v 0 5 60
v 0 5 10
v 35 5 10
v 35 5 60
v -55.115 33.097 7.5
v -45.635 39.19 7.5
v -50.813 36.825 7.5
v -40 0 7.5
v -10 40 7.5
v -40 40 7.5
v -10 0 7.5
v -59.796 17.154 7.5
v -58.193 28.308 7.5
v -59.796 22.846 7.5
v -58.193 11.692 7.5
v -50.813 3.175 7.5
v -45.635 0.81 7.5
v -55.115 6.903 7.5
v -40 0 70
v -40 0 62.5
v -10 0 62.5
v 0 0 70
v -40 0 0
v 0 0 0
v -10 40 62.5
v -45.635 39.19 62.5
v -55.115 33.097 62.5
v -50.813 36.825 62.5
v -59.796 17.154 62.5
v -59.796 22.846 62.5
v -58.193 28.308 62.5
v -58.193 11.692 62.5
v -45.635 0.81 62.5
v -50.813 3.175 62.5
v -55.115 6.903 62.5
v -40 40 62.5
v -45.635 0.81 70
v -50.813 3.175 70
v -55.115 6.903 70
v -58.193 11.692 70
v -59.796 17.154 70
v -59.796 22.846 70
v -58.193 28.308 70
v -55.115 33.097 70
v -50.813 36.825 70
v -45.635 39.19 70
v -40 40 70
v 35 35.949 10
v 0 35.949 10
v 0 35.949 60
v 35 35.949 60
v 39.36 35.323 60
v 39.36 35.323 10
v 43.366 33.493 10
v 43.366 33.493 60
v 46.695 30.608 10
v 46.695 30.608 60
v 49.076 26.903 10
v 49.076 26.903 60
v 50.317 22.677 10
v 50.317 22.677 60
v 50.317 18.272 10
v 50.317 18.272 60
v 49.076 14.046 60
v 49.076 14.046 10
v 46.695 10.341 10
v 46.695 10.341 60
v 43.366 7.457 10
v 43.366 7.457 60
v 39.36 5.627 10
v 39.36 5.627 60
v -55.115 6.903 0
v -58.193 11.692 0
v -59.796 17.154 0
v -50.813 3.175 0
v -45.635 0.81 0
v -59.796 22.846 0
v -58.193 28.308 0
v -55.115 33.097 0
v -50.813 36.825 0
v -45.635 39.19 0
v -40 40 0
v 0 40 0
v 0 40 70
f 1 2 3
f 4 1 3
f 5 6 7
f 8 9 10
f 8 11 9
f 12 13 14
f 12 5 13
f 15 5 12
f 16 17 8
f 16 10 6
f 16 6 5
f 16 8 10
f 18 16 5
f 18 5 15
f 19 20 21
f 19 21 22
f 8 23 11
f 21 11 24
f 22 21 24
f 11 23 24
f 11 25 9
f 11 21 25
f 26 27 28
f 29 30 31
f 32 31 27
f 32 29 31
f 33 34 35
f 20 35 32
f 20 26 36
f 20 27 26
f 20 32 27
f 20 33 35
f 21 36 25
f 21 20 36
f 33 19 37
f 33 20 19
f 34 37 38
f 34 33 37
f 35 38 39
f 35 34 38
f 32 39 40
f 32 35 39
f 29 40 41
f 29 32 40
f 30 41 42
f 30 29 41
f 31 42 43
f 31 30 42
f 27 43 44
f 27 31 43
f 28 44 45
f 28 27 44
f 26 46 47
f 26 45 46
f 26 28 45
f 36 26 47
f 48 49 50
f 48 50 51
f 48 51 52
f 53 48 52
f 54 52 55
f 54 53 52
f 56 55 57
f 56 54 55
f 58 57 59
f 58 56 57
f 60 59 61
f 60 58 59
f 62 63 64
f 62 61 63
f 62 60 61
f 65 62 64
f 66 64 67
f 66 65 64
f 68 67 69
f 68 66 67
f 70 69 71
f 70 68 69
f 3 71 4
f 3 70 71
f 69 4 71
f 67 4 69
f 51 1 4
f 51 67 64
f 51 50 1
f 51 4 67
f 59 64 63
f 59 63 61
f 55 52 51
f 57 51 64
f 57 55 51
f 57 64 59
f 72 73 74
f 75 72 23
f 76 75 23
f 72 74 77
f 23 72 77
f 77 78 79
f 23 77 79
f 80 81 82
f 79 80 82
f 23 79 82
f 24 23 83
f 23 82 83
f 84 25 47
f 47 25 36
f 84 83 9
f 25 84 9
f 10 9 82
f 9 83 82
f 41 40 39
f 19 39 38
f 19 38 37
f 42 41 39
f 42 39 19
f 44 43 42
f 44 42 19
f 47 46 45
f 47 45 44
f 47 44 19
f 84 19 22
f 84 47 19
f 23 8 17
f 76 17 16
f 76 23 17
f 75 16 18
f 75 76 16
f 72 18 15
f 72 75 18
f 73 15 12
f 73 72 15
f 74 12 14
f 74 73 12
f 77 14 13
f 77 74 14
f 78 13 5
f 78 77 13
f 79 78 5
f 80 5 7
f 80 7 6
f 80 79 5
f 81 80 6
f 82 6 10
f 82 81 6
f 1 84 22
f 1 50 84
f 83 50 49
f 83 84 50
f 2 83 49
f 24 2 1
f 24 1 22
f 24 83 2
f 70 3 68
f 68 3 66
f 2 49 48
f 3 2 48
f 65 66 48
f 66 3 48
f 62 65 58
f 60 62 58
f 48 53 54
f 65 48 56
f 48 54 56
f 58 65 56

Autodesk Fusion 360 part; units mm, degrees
sketch "Sketch1" plane through (0, 0, 0) normal (0, 0, 1) x (1, 0, 0)
  line L0 (0, 0) -> (0, 31.8988)
  line L1 (0, 31.8988) -> (70, 31.8988)
  line L2 (0, 0) -> (0, -30)
  line L3 (0, -30) -> (70, -30)
  arc A0 (70, -30) -> (70, 31.8988) centre (70, 0.9494) ccw
  dimension "d1" = 70
  dimension "d2" = 30
  dimension "d23" = 70
extrude "Extrude1" add sketch "Sketch1" along normal mid plane 100
sketch "Sketch6" plane through (0, 0, 0) normal (0, 0, 1) x (1, 0, 0)
  line L0 (0, 0) -> (0, 40)
  line L1 (0, 0) -> (0, -40)
  line L2 (0, 40) -> (-80, 40)
  line L3 (-80, -40) -> (0, -40)
  line L4 (-80, -40) -> (-80, 40) construction
  arc A0 (-80, 40) -> (-80, -40) centre (-80, 0) ccw
  dimension "d24" = 40
  dimension "d25" = 40
  dimension "d42" = 80
extrude "Extrude5" add sketch "Sketch6" along normal mid plane 140
sketch "Sketch8" plane through (0, 0, 70) normal (0, 0, 1) x (-1, 0, 0)
  line L0 (0, 40) -> (0, -40)
  line L1 (0, -40) -> (80, -40)
  line L2 (80, 40) -> (0, 40)
  circle A0 centre (80, 0) radius 17.5 construction
  line L3 (80, 0) -> (80, -30) construction
  line L4 (80, 0) -> (48.1334, 0) construction
  line L5 (80, 0) -> (53.2858, -26.7142) construction
  circle A1 centre (67.6256, -12.3744) radius 2
  circle A2 centre (92.3744, -12.3744) radius 2
  circle A3 centre (92.3744, 12.3744) radius 2
  circle A4 centre (67.6256, 12.3744) radius 2
  arc A5 (80, -40) -> (80, 40) centre (80, 0) ccw
  dimension "d33" = 35
  dimension "d35" = 45
  dimension "d36" = 4
  dimension "d38" = 360
sketch "Sketch9" plane through (0, -40, 0) normal (0, -1, 0) x (1, 0, 0)
  line L0 (0, -70) -> (0, 70)
  line L1 (0, 70) -> (-80, 70)
  line L2 (-80, 70) -> (-80, -70)
  line L3 (-80, -70) -> (0, -70)
  line L4 (-160, 55) -> (-20, 55)
  line L5 (-20, 55) -> (-20, -55)
  line L6 (-20, -55) -> (-160, -55)
  line L7 (-160, -55) -> (-160, 55)
  dimension "d44" = 15
  dimension "d45" = 15
  dimension "d46" = 20
extrude "Extrude8" cut sketch "Sketch9" against normal blind 140 contours L2 L4 L6 L7 | L2 L4 L5 L6
sketch "Sketch10" plane through (0, 0, 0) normal (0, 1, 0) x (1, 0, 0)
  line L0 (70, -35) -> (70, -15) construction
  line L1 (70, 15) -> (70, 35) construction
  line L2 (70, 50) -> (70, -50)
  point P0 (70, -50)
  point P1 (70, 50)
  dimension "d49" = 20
  dimension "d50" = 20
  dimension "d51" = 30
  dimension "d52" = 15
  dimension "d53" = 15
scale "Scale1" factor 0.5 about (0, 40, 70) bodies 1
